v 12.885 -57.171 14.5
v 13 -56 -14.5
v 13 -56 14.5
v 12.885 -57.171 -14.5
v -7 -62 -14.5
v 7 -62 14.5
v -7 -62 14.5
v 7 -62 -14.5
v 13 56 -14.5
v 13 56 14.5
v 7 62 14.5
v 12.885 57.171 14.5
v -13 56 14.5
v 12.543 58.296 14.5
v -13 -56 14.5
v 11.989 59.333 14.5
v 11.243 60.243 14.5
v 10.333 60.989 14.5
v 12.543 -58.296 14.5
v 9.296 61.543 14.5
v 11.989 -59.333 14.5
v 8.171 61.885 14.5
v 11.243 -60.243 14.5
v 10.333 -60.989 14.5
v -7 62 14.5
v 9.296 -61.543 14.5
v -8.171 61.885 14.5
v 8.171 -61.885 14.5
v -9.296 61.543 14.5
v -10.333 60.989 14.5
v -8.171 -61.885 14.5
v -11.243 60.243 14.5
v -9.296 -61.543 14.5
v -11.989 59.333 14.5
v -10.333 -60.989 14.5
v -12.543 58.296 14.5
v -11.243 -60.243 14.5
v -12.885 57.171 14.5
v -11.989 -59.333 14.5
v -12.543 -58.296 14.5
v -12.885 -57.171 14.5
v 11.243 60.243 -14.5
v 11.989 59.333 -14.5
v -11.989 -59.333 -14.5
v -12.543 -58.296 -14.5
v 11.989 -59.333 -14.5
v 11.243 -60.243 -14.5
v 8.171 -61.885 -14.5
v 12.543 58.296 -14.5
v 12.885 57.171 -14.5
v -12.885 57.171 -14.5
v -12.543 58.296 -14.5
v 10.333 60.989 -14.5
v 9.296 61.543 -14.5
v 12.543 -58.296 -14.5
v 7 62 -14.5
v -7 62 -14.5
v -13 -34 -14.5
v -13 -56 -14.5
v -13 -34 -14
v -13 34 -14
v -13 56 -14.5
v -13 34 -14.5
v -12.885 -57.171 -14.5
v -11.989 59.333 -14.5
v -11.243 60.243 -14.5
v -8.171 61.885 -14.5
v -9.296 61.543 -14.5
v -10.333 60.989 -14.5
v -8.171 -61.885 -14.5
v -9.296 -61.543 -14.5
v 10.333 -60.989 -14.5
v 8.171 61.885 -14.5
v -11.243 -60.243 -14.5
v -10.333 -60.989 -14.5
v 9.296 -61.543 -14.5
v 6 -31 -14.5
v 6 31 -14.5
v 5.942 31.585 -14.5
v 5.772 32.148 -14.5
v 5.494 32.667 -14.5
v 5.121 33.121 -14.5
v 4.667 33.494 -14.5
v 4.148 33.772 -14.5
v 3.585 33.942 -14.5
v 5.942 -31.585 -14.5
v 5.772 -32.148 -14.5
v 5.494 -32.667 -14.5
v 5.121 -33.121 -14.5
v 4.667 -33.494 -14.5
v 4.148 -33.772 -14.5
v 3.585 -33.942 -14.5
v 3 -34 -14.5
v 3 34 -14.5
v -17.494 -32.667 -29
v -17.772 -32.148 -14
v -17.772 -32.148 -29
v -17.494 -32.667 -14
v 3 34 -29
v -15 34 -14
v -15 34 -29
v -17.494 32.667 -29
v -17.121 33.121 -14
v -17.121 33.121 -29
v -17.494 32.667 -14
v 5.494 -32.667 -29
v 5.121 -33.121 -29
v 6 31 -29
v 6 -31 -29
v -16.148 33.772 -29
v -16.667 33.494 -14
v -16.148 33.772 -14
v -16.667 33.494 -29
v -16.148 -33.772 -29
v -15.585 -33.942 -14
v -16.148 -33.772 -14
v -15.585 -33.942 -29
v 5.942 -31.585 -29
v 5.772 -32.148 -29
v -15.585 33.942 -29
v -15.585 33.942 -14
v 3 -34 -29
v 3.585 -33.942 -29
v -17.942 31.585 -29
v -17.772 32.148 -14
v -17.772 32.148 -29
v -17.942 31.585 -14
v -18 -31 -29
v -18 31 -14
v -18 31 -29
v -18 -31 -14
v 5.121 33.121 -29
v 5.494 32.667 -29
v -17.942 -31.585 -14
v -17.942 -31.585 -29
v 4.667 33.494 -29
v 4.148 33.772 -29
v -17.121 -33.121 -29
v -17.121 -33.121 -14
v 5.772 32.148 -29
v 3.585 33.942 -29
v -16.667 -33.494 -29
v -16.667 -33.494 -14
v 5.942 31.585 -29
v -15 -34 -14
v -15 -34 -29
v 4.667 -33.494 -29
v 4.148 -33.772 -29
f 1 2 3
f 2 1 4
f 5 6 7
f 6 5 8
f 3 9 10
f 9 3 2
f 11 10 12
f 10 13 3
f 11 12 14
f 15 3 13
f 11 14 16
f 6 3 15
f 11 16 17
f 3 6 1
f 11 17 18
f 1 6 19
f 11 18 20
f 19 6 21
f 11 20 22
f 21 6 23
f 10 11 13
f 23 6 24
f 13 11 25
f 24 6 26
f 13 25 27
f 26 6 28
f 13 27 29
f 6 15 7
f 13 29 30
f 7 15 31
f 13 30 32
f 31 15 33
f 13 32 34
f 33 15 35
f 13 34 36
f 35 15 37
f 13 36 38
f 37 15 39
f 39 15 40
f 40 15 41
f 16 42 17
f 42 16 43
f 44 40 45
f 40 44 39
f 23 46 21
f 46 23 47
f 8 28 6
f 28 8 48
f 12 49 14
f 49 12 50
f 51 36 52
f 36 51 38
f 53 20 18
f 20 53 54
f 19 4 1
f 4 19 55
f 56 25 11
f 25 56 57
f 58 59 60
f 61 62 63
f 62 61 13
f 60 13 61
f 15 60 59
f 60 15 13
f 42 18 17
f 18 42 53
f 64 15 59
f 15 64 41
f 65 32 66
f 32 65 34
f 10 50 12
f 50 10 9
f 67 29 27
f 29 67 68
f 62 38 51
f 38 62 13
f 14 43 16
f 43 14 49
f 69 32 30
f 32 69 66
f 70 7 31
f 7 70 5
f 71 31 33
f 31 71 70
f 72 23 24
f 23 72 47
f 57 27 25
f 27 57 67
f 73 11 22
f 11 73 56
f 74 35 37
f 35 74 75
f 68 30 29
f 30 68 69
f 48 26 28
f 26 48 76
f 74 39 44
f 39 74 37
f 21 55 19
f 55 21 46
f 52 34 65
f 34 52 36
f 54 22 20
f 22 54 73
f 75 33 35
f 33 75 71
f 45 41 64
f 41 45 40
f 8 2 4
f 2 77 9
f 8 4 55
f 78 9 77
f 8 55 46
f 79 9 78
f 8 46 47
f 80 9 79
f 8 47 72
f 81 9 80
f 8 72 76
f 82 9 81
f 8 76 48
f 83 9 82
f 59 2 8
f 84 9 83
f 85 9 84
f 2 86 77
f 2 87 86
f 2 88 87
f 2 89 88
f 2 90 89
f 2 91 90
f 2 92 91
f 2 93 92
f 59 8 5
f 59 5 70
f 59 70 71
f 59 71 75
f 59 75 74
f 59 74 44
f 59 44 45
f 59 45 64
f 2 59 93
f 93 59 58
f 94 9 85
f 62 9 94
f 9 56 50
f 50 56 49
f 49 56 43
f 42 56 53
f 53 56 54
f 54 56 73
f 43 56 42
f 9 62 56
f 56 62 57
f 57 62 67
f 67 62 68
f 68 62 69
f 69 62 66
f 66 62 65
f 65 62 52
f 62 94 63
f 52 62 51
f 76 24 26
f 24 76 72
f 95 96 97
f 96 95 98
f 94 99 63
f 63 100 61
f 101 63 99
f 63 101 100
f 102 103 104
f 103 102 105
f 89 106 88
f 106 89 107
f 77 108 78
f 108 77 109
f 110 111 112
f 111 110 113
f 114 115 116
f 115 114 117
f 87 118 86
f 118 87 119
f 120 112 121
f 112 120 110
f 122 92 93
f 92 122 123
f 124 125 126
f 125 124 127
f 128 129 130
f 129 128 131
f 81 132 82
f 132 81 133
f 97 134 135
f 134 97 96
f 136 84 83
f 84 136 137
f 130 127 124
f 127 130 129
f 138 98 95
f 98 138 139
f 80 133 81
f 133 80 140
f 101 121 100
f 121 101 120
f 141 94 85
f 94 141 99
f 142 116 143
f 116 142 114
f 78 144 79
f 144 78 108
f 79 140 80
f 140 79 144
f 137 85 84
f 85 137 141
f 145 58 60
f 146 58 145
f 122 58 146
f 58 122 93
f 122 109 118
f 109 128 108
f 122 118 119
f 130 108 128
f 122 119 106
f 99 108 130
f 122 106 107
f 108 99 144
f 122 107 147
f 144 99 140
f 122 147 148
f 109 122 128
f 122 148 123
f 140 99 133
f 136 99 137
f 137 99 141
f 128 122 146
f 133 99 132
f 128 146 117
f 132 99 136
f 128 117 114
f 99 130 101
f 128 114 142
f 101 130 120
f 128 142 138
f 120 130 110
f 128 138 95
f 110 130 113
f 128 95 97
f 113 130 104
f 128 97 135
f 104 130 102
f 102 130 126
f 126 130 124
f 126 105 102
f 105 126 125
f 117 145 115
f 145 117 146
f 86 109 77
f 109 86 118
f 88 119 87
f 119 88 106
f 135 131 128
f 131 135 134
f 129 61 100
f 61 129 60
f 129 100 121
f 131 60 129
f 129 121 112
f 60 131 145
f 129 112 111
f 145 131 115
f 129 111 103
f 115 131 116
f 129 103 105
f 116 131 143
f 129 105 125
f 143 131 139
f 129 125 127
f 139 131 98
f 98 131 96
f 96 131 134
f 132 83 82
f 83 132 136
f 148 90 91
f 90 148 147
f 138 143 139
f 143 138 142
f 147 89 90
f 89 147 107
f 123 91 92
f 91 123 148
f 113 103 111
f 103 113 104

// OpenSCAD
use <main.scad>
camera_pos_x        = 415;
camera_mount_height = 285;
d455_length         = 26;
d455_width          = 124;
d455_height         = 29;
show_component_labels = false;
translate([-camera_pos_x, 0, -camera_mount_height])
    realsense_body();
